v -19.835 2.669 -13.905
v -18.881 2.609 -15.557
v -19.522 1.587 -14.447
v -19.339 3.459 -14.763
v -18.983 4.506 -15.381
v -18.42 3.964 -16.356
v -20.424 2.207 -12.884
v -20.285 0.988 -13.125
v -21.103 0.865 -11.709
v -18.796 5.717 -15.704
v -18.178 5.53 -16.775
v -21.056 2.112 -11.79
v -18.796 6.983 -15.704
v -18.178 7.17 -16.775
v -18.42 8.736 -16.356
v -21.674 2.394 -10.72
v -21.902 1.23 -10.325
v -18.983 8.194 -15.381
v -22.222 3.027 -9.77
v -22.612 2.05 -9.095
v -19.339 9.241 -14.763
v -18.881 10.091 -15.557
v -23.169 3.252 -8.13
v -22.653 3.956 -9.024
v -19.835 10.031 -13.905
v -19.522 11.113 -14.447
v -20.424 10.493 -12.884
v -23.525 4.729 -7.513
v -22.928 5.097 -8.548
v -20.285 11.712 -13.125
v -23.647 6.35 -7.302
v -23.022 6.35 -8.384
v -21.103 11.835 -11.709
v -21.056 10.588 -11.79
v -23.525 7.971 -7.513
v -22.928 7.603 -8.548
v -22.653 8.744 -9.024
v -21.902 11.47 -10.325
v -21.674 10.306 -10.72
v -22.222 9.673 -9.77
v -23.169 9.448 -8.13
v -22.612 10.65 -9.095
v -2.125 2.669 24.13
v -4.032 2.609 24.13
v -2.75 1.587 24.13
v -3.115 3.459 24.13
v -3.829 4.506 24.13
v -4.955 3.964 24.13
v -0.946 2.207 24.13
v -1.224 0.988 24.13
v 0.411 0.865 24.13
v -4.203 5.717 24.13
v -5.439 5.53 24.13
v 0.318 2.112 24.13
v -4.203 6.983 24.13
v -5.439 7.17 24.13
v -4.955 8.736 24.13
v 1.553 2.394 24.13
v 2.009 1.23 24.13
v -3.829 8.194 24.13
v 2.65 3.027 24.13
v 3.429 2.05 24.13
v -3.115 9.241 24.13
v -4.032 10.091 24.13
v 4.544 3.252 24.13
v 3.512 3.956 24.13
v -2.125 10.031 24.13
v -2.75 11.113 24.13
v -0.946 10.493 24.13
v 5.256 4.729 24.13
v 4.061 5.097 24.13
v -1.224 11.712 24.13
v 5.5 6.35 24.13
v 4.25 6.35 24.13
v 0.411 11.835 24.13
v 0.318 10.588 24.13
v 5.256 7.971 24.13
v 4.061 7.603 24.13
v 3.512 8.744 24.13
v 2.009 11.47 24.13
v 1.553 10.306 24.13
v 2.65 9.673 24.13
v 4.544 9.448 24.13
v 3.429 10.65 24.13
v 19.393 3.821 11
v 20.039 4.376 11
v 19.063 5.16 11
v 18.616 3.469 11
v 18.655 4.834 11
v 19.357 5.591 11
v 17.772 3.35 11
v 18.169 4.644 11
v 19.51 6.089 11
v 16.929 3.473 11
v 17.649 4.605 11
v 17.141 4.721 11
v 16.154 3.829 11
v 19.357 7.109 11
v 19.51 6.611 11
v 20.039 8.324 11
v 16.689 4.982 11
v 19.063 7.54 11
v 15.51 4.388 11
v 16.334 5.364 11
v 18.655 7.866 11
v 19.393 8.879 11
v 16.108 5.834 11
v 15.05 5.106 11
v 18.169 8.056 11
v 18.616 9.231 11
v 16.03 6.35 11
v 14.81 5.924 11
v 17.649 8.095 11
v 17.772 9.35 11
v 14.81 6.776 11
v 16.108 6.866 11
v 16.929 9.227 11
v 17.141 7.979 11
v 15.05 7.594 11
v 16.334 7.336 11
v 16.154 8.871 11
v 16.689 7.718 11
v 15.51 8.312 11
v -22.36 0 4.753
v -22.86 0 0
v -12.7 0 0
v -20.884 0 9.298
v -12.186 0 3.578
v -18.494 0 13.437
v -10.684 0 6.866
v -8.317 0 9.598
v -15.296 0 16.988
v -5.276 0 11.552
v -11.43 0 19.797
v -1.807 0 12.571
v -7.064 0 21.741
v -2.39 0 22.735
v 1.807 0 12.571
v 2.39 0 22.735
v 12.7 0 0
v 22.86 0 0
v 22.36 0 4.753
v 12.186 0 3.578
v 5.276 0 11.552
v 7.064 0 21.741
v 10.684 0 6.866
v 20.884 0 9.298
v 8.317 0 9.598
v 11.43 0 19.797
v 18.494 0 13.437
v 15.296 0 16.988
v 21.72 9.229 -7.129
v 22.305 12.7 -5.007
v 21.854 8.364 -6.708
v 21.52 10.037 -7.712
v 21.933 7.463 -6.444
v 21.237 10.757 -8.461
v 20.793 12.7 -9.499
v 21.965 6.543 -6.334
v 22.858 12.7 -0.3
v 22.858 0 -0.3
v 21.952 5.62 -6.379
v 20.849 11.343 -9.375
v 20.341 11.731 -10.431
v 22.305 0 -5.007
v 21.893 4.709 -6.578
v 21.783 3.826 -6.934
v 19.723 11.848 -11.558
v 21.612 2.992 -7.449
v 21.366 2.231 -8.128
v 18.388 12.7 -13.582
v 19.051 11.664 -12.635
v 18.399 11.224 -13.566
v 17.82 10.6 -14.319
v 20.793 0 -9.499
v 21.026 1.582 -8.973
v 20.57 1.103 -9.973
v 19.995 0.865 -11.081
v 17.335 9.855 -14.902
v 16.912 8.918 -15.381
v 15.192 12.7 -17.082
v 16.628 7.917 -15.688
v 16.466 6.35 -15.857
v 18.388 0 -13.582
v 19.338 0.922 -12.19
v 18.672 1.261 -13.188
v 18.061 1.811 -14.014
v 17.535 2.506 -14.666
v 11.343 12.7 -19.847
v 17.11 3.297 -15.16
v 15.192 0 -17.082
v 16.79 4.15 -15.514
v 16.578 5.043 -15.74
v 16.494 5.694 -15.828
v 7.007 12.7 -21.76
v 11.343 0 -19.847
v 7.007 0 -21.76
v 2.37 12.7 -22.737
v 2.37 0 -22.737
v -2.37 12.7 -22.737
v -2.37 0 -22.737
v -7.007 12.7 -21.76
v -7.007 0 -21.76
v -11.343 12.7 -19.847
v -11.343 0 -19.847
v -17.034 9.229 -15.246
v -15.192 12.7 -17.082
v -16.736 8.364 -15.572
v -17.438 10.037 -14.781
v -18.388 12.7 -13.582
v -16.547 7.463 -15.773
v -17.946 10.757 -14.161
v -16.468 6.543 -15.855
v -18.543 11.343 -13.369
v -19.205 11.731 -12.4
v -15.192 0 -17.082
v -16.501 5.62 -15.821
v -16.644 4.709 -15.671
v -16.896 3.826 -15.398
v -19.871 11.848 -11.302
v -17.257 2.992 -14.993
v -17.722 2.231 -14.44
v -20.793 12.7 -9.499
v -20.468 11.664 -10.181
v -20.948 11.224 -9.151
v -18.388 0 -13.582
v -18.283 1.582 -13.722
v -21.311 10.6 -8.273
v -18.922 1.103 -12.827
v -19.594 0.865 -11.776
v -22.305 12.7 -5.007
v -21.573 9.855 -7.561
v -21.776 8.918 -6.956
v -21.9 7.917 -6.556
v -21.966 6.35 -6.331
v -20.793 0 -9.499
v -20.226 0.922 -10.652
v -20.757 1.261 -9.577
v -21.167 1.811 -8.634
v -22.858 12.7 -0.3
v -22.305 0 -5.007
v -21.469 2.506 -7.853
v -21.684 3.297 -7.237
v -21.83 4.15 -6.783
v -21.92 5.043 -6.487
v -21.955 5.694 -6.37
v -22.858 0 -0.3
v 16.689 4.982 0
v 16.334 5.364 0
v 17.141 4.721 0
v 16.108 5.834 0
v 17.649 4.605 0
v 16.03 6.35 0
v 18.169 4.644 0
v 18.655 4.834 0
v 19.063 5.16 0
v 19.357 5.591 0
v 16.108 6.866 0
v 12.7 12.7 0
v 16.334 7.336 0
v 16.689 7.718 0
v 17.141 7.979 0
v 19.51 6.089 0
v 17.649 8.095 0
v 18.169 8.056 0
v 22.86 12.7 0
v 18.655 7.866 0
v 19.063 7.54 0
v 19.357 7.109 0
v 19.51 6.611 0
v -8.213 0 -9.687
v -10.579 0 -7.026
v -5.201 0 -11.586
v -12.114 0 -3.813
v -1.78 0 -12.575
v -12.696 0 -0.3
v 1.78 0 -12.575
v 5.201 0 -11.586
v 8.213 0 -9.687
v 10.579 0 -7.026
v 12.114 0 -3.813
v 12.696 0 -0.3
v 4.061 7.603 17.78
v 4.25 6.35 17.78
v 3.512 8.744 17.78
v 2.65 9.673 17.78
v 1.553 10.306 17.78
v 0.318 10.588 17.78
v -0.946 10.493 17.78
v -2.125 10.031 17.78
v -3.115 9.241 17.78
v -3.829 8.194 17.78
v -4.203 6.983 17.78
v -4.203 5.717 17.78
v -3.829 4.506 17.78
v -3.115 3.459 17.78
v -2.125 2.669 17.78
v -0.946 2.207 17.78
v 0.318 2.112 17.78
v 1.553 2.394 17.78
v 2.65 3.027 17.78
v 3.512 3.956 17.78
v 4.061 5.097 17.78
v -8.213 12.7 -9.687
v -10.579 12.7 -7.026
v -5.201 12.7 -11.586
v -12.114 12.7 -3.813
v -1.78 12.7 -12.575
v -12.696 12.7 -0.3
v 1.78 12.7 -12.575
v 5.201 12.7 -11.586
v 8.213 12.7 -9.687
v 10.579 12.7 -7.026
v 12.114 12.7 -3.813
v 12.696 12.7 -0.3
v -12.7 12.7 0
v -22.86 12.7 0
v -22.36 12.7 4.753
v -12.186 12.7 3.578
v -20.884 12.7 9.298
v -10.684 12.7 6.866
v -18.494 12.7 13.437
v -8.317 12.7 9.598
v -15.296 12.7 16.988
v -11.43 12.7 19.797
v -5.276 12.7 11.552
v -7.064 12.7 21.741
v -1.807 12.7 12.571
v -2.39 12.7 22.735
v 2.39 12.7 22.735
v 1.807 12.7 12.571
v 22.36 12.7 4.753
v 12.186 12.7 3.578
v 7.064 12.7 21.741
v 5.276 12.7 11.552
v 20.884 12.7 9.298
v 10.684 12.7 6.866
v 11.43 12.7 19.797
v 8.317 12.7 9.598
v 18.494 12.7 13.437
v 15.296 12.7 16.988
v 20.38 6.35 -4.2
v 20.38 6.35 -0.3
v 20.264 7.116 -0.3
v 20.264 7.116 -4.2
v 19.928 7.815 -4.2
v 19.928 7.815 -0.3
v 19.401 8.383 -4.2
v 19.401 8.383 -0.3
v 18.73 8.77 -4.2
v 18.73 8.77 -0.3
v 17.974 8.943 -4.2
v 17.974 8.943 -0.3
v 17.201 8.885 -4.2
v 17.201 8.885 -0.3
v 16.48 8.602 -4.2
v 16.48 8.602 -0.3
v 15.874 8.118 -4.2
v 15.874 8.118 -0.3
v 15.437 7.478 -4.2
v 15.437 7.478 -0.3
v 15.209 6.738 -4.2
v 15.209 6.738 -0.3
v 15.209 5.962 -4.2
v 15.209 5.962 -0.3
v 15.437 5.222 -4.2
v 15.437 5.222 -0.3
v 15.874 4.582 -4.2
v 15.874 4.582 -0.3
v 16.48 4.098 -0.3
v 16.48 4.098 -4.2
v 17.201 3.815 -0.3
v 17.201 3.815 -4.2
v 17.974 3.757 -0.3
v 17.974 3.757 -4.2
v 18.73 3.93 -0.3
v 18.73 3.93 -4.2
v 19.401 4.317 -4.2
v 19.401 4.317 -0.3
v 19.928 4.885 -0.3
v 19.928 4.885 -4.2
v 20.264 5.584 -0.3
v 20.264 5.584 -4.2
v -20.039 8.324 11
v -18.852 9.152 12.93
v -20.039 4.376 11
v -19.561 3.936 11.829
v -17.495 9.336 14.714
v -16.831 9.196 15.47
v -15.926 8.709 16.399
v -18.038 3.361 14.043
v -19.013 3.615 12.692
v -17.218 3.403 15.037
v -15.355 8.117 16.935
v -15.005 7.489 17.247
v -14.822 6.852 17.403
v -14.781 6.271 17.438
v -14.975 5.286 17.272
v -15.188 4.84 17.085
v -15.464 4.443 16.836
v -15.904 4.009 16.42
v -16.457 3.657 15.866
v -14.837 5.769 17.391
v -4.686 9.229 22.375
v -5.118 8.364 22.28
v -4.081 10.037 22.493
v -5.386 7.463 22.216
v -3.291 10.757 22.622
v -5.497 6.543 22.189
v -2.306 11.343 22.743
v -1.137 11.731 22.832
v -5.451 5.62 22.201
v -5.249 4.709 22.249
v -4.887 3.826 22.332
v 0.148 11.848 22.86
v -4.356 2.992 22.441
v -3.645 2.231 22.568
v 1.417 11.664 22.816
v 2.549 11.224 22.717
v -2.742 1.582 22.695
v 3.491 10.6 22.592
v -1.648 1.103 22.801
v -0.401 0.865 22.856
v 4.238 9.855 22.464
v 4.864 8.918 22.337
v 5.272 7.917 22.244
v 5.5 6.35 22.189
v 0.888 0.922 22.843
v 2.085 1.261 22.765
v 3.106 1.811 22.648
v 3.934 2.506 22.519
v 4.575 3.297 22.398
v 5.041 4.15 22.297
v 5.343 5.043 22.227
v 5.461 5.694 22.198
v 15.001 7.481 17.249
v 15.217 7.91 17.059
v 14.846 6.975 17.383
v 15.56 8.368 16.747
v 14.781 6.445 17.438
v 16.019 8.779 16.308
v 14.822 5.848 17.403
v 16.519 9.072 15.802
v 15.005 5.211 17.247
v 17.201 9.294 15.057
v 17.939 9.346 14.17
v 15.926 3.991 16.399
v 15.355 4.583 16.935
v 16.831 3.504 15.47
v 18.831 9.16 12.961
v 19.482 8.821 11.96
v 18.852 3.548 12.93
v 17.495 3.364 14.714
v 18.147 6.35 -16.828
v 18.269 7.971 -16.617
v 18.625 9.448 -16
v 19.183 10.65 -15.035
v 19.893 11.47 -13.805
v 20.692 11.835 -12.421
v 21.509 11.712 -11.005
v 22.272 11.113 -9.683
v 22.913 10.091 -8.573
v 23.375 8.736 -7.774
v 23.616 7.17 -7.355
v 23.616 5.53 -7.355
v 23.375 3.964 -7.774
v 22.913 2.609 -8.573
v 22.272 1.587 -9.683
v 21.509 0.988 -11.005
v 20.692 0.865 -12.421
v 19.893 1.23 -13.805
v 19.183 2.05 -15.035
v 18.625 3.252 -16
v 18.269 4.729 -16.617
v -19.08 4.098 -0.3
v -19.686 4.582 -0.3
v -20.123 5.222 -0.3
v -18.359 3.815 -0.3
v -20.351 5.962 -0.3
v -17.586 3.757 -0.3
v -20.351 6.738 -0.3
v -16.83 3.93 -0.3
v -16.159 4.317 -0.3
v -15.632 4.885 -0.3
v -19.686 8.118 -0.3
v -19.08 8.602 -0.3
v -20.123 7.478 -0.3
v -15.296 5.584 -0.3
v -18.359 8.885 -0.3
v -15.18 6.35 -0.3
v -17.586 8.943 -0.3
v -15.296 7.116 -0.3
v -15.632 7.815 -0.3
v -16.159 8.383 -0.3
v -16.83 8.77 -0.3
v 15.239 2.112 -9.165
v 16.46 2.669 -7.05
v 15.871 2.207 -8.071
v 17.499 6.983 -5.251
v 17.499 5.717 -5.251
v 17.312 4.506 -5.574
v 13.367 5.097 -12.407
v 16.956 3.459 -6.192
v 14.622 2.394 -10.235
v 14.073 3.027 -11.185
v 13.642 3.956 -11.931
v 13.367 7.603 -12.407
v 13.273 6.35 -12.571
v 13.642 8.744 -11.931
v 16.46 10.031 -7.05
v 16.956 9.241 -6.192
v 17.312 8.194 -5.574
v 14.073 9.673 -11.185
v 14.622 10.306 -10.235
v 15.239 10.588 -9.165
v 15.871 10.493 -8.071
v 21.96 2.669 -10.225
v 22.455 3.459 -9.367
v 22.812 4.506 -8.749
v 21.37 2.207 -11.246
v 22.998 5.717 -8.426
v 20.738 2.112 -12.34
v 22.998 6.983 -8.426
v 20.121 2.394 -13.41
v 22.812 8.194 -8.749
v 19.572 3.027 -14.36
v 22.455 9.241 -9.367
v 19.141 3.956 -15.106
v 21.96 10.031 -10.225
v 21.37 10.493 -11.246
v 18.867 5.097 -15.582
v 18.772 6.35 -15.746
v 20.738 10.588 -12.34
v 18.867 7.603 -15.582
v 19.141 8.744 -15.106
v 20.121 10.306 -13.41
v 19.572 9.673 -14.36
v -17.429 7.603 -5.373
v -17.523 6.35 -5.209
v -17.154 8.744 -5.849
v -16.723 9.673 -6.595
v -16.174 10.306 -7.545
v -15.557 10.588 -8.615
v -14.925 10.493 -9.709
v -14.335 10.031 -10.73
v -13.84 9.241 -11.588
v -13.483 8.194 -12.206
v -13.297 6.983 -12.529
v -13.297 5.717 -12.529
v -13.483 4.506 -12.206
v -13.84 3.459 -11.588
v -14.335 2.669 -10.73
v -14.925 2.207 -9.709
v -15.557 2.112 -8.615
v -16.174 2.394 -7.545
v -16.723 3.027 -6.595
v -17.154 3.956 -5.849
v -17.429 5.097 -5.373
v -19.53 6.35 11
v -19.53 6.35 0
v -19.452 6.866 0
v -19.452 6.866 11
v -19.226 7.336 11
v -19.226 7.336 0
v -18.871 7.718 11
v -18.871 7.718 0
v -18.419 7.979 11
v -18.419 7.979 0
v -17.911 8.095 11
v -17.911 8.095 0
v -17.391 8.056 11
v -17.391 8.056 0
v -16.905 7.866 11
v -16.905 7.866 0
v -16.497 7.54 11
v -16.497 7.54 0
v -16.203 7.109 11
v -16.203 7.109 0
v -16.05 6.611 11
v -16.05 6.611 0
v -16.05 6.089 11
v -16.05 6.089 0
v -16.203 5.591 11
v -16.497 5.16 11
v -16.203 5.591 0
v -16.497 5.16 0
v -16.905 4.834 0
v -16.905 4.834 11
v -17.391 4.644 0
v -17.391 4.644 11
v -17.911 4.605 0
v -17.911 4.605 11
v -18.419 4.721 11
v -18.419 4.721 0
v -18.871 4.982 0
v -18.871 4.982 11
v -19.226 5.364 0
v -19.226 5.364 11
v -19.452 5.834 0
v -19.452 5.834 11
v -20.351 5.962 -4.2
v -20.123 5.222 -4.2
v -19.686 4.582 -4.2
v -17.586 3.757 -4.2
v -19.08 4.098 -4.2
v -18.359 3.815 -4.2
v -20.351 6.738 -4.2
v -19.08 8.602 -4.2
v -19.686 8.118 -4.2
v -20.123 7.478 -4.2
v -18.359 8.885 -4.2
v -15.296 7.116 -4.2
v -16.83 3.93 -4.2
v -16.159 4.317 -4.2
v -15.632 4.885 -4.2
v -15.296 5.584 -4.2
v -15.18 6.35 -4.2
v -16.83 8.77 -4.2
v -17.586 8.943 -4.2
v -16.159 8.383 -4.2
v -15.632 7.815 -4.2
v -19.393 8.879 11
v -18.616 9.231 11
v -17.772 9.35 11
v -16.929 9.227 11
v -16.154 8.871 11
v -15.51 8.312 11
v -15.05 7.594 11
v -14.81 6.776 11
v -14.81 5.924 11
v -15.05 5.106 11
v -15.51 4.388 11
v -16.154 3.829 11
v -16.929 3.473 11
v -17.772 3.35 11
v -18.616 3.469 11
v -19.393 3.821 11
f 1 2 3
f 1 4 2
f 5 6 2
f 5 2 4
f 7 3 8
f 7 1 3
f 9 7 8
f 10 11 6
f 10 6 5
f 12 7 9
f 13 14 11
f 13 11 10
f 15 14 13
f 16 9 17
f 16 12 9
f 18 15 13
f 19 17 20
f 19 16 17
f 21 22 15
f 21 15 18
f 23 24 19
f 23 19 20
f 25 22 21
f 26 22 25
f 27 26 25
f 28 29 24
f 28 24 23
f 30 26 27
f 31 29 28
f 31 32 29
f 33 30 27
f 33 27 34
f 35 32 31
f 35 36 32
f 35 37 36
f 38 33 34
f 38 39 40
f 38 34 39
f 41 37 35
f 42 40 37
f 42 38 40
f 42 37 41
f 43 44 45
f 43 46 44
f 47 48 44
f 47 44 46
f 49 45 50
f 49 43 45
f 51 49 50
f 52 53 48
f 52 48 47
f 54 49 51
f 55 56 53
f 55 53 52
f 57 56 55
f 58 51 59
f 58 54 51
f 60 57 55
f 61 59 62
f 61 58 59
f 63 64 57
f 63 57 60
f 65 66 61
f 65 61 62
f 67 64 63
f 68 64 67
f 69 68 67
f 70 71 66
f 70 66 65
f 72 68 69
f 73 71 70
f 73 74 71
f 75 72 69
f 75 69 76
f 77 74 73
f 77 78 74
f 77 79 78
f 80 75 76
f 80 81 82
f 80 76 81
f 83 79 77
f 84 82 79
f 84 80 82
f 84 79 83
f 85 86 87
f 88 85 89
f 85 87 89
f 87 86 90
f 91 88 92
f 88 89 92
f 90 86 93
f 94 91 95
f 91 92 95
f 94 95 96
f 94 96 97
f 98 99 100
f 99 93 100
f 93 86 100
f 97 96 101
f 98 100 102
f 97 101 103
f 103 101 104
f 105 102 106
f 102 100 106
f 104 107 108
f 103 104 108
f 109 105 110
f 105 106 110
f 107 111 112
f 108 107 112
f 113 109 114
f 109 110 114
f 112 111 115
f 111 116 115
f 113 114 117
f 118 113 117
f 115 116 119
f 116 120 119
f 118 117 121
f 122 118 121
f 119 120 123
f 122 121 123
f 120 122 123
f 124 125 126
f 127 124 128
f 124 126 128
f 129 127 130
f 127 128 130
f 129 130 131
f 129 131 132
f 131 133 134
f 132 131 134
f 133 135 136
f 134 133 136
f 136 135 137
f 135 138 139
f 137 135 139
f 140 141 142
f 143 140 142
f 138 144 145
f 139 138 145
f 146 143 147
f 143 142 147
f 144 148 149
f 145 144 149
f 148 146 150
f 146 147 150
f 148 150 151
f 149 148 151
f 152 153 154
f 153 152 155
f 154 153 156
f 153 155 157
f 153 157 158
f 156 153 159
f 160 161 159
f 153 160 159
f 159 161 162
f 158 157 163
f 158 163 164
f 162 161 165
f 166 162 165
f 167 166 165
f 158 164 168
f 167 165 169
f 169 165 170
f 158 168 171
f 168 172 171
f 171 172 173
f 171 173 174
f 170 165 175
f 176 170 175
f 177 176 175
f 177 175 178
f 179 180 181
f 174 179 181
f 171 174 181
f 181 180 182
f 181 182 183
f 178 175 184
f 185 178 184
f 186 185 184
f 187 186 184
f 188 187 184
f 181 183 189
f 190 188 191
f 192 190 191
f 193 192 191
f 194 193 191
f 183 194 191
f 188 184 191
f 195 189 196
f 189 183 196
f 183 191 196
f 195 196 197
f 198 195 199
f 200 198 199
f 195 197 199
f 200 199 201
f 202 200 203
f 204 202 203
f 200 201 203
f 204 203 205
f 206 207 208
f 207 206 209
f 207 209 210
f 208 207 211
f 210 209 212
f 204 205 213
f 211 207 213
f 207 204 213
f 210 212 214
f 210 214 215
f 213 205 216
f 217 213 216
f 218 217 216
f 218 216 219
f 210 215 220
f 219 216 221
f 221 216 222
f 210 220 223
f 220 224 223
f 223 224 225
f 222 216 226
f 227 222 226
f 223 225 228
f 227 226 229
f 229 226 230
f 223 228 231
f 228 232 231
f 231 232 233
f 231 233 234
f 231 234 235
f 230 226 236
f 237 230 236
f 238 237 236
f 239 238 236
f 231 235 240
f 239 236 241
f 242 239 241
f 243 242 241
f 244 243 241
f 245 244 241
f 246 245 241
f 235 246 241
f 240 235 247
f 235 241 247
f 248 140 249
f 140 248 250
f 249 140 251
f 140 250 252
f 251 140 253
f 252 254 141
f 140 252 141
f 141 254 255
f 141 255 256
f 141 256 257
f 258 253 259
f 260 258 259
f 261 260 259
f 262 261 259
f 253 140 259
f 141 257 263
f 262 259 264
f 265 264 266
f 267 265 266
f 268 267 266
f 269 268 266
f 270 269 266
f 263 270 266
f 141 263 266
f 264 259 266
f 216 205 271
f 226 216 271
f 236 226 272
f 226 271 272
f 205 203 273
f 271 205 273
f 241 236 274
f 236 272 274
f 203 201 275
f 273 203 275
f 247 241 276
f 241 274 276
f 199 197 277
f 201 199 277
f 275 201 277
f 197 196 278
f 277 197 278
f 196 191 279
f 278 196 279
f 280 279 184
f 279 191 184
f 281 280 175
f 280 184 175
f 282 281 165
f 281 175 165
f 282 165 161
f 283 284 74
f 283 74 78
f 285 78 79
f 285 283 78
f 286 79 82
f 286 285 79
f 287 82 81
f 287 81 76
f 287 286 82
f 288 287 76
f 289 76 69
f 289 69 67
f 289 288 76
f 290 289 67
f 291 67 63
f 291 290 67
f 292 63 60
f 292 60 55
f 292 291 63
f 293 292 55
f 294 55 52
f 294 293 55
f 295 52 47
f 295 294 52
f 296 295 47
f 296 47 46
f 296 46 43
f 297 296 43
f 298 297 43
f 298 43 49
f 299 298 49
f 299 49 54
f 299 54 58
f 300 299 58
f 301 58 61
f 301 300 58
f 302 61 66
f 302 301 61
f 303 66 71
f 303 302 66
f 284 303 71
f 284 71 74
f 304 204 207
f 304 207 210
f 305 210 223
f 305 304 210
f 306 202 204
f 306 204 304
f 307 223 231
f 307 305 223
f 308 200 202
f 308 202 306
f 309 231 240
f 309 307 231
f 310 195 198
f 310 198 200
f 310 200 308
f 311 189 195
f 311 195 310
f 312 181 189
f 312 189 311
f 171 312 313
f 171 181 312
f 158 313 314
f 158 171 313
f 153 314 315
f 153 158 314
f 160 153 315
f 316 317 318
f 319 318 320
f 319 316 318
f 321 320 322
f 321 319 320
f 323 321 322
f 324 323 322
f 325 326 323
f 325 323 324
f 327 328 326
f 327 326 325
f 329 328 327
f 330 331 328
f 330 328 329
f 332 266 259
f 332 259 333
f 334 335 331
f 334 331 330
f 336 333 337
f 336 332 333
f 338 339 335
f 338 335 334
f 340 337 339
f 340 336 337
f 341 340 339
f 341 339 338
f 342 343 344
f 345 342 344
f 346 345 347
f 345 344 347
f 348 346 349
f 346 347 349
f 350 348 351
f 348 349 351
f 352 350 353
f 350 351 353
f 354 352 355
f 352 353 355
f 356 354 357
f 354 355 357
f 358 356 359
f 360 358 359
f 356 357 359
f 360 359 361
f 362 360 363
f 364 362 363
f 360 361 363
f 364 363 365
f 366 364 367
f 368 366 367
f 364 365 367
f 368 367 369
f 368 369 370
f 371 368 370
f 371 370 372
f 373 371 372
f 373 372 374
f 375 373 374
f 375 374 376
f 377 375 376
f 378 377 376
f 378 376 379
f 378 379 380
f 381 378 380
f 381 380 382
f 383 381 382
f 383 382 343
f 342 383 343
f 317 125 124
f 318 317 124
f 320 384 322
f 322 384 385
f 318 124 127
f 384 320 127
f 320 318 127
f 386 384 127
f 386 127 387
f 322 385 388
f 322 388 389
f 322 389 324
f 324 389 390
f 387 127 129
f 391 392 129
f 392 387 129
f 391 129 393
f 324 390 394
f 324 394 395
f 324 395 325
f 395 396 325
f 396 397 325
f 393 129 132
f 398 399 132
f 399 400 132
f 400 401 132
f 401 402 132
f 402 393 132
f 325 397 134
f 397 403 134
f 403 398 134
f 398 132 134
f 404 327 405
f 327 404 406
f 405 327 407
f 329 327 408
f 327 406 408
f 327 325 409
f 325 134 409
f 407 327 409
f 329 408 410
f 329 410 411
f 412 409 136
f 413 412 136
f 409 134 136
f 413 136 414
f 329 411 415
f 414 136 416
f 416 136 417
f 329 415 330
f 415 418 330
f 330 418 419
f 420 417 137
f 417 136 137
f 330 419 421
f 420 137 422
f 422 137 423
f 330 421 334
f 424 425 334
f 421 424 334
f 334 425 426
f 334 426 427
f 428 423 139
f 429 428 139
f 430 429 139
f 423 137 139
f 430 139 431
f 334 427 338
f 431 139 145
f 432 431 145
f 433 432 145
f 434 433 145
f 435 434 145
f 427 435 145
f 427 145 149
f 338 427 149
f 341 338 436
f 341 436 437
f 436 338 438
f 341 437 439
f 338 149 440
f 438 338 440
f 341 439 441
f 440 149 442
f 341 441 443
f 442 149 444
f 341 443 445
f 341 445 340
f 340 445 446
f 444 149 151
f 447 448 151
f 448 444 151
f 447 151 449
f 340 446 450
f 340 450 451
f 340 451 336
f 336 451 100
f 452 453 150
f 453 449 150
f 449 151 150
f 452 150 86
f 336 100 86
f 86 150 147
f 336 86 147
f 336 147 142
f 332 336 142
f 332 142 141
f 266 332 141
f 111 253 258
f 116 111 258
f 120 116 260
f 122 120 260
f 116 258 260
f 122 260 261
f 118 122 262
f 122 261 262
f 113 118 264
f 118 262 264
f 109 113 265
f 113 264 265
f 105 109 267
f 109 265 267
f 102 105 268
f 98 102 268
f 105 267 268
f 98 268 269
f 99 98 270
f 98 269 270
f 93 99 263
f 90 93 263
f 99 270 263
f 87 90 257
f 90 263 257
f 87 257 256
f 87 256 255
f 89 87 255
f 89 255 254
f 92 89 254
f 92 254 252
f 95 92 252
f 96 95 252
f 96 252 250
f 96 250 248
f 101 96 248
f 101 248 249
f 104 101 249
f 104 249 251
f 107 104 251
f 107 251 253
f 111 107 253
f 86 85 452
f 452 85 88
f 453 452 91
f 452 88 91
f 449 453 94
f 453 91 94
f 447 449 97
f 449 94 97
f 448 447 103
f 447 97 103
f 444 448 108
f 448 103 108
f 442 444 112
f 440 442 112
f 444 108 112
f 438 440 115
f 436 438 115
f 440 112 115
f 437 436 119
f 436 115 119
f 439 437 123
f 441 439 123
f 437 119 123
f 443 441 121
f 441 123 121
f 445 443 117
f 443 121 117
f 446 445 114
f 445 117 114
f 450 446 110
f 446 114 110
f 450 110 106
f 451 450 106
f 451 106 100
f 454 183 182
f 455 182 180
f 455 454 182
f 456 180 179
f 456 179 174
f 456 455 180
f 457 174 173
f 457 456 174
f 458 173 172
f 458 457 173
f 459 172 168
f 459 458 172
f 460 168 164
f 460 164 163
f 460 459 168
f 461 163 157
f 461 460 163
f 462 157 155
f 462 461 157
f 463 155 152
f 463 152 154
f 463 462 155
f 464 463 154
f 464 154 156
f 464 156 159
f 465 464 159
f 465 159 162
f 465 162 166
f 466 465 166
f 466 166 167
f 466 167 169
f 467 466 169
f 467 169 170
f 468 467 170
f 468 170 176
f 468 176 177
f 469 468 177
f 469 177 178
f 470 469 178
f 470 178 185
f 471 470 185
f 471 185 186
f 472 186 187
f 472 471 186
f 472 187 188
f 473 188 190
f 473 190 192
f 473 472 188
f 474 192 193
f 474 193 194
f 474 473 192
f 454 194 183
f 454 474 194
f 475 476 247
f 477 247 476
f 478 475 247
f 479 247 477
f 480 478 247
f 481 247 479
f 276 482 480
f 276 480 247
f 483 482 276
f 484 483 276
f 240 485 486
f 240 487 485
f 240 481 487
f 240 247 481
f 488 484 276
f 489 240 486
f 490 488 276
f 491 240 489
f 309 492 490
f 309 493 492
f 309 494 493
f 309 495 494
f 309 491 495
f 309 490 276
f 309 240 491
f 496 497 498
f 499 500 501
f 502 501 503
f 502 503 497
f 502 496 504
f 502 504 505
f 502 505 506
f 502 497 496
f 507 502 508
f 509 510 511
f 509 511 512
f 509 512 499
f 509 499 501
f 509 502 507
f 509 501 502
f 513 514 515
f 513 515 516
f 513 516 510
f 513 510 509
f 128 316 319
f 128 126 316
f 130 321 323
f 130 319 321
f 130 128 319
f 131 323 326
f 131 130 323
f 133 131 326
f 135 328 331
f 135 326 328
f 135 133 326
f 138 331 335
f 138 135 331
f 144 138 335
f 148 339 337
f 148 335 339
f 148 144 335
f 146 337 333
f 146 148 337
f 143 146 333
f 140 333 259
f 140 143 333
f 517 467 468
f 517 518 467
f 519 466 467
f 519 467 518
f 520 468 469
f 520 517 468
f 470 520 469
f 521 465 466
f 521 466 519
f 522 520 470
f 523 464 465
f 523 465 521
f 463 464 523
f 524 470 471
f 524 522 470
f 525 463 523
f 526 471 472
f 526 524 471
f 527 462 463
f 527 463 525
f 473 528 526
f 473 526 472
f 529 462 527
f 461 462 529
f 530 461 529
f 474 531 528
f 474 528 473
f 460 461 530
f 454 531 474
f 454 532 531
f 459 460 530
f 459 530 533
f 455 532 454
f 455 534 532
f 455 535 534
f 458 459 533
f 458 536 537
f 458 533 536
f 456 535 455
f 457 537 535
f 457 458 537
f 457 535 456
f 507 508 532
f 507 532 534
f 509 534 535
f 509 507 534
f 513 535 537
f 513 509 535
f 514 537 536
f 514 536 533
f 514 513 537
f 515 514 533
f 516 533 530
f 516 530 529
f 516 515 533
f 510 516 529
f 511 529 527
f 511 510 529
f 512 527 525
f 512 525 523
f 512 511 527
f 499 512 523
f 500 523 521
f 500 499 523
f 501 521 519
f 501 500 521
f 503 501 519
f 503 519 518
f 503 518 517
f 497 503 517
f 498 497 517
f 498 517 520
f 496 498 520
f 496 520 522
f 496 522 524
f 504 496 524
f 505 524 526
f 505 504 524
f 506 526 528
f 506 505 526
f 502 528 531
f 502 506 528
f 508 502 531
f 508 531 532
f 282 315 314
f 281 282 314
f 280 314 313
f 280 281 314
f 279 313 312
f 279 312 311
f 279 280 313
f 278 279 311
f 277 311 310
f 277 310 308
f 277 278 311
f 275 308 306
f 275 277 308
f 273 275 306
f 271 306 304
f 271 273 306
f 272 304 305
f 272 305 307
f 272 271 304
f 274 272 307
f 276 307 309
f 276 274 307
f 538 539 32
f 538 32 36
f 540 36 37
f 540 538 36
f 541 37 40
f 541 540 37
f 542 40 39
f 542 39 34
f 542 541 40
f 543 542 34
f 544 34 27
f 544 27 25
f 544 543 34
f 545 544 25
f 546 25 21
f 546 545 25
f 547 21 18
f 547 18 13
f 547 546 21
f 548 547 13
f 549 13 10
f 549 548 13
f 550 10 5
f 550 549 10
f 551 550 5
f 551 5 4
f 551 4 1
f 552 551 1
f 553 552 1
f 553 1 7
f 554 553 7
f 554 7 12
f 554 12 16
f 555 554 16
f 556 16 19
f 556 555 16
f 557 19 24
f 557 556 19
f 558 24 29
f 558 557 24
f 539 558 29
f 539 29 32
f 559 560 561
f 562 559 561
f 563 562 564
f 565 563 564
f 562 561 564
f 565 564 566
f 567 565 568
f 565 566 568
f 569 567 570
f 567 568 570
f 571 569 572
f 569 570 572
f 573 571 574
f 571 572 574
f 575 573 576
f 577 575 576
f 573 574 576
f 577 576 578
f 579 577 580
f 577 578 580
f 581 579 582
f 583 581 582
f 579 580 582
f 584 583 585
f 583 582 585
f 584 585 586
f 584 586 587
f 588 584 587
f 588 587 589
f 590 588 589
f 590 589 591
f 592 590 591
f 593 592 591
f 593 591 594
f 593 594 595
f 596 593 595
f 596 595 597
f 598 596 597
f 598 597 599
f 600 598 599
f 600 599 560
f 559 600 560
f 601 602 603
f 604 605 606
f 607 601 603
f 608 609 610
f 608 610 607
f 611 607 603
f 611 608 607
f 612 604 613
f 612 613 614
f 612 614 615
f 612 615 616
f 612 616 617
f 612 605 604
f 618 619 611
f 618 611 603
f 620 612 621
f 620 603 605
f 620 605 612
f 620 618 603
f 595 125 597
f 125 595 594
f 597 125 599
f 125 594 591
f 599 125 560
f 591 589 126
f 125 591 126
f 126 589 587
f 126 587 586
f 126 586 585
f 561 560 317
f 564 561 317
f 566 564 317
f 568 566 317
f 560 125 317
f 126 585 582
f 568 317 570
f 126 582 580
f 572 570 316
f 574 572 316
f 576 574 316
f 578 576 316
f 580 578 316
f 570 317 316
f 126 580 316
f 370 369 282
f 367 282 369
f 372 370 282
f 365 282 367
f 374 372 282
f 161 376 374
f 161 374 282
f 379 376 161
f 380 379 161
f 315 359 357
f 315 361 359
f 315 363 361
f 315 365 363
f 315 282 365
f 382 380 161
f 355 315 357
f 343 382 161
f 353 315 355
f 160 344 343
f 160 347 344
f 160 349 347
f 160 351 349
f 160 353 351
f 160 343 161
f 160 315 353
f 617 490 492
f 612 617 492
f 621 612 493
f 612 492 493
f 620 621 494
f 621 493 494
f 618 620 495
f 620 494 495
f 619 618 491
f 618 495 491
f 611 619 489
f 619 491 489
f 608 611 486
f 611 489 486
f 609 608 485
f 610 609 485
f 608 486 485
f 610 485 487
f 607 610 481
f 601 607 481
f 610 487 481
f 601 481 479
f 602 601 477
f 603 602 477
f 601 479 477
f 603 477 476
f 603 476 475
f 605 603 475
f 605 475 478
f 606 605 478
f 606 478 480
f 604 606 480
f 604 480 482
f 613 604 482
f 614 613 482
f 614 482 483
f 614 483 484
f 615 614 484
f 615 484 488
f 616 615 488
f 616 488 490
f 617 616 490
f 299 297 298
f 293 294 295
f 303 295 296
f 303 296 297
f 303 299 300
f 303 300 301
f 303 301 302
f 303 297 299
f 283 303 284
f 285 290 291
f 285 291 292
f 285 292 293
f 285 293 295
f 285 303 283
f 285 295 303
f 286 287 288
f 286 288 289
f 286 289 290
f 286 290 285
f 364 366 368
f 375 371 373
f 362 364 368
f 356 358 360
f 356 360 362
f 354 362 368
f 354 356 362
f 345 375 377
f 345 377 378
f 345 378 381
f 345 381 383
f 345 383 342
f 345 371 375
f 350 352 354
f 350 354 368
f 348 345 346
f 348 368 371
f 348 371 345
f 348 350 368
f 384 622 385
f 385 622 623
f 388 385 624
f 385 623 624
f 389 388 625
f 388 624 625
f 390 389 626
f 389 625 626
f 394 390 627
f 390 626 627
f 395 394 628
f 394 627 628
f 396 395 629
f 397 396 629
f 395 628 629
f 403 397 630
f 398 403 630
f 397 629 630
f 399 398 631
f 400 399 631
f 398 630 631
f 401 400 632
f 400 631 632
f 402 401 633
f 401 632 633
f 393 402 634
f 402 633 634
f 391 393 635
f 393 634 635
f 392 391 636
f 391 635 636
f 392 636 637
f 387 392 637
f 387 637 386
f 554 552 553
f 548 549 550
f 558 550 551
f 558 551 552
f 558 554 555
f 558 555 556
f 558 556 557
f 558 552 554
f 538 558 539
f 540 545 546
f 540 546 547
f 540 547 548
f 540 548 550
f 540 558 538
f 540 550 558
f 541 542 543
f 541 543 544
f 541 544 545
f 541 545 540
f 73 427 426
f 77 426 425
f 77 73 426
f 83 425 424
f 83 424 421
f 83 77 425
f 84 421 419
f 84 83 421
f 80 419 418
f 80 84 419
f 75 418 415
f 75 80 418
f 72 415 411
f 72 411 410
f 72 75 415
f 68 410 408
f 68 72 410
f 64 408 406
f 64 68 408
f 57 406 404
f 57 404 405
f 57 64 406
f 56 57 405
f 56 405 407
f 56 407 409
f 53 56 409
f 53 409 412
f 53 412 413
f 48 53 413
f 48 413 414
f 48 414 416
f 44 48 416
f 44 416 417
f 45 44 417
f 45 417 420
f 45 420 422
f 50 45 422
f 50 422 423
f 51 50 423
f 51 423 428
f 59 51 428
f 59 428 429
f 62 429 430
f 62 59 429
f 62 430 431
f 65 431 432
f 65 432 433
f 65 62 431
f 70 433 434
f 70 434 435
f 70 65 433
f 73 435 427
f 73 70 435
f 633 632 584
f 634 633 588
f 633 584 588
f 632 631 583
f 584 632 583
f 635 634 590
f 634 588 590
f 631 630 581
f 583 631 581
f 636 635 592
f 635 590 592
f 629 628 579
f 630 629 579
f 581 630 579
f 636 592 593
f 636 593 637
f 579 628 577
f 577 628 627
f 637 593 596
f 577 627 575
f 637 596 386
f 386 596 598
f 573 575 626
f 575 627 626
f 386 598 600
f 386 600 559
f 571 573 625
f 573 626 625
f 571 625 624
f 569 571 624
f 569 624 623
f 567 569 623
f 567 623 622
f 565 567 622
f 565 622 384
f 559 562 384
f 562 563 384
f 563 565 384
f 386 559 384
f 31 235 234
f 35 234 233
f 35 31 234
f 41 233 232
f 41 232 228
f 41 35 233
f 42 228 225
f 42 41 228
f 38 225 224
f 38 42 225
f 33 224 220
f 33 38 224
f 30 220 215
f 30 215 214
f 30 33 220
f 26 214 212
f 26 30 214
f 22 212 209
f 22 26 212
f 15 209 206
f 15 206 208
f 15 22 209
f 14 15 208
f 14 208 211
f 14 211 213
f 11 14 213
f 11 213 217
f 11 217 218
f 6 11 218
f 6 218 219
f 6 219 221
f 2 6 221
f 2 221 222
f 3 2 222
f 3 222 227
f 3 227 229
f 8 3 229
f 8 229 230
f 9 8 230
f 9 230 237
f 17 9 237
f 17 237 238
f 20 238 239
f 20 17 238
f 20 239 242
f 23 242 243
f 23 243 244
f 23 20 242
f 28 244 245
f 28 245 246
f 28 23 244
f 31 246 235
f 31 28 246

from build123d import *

# Parameters (mm, degrees)
SKETCH1_R                = 22.86
SKETCH1_R_2              = 12.7
BOSS_EXTRUDE1_DEPTH      = 12.7
BOSS_EXTRUDE2_REACH      = 55.777
BOSS_EXTRUDE2_END_RADIUS = 22.86
SKETCH4_R                = 5.5
CUT_EXTRUDE3_START       = 17.78
SKETCH2_R                = 4.25
CUT_EXTRUDE3_DEPTH       = 6.35
CIRPATTERN1_COUNT        = 3
SKETCH5_R                = 2.6
CUT_EXTRUDE4_DEPTH       = 4.2
SKETCH5_3_R              = 2.6
CUT_EXTRUDE5_DEPTH       = 0.3
CUT_EXTRUDE6_REACH       = 38.093
CUT_EXTRUDE6_END_RADIUS  = 22.86
SKETCH6_R                = 1.75
CUT_EXTRUDE7_START       = -11
SKETCH6_3_R              = 3
CUT_EXTRUDE7_DEPTH       = 26.09344329


with BuildPart() as part:
    # Sketch1 → Boss-Extrude1 (new body)
    with BuildSketch(Plane(origin=(0, 0, 0), x_dir=(1, 0, 0), z_dir=(0, 1, 0))):
        with Locations(Location((0, 0, 0), (0, 0, 270))):
            Circle(SKETCH1_R)
        with Locations(Location((0, 0, 0), (0, 0, 270))):
            Circle(SKETCH1_R_2, mode=Mode.SUBTRACT)
    extrude(amount=BOSS_EXTRUDE1_DEPTH)

    # Boss-Extrude2: up to this cylinder (the profile starts outside it)
    boss_extrude2_end = Plane(origin=(0, 6.35, 0), z_dir=(0, -1, 0)) * Cylinder(BOSS_EXTRUDE2_END_RADIUS, 158.274, mode=Mode.PRIVATE)
    # Sketch4 → Boss-Extrude2 (add, up to the surface)
    with BuildSketch(Plane.XY.offset(24.13), mode=Mode.PRIVATE) as boss_extrude2_sk1:
        with Locations((0, 6.35)):
            Circle(SKETCH4_R)
    boss_extrude2_tool1 = extrude(boss_extrude2_sk1.sketch, amount=-BOSS_EXTRUDE2_REACH, mode=Mode.PRIVATE) - boss_extrude2_end
    boss_extrude2 = boss_extrude2_tool1.solids().sort_by_distance((0, 6.35, 24.13))[0]
    add(boss_extrude2)

    # Sketch2 → Cut-Extrude3 (cut)
    with BuildSketch(Plane.XY.offset(CUT_EXTRUDE3_START)):
        with Locations((0, 6.35)):
            Circle(SKETCH2_R)
    cut_extrude3 = extrude(amount=CUT_EXTRUDE3_DEPTH, mode=Mode.SUBTRACT)

    # CirPattern1: Boss-Extrude2, Cut-Extrude3 ×3 about axis
    cirpattern1_axis = Axis((0, 0, 0), (0, 1, 0))
    add([boss_extrude2.rotate(cirpattern1_axis, i * 360 / CIRPATTERN1_COUNT) for i in range(1, CIRPATTERN1_COUNT)])
    add([cut_extrude3.rotate(cirpattern1_axis, i * 360 / CIRPATTERN1_COUNT) for i in range(1, CIRPATTERN1_COUNT)], mode=Mode.SUBTRACT)


with BuildPart() as body_2:
    # Split1: the piece on the far side of the plane
    add(part.part)
    split(bisect_by=Plane.XY, keep=Keep.BOTTOM)

    # Sketch5 → Cut-Extrude4 (cut)
    with BuildSketch(Plane.XY):
        with Locations((17.78, 6.35)):
            Circle(SKETCH5_R)
        with Locations((-17.78, 6.35)):
            Circle(SKETCH5_R)
    extrude(amount=-CUT_EXTRUDE4_DEPTH, mode=Mode.SUBTRACT)

    # Sketch5<3> → Cut-Extrude5 (cut)
    with BuildSketch(Plane.XY):
        Polygon((22.86, 12.7), (12.7, 12.7), (-22.86, 12.7), (-22.86, 0), (12.7, 0), (22.86, 0), align=None)
        with Locations((-17.78, 6.35)):
            Circle(SKETCH5_3_R, mode=Mode.SUBTRACT)
        with Locations((17.78, 6.35)):
            Circle(SKETCH5_3_R, mode=Mode.SUBTRACT)
    extrude(amount=-CUT_EXTRUDE5_DEPTH, mode=Mode.SUBTRACT)


with BuildPart() as part_1:
    add(part.part)

    # Split1
    split(bisect_by=Plane.XY, keep=Keep.TOP)

    # Cut-Extrude6: up to this cylinder (the profile starts inside it)
    cut_extrude6_end = Plane(origin=(0, 6.35, 0), z_dir=(0, -1, 0)) * Cylinder(CUT_EXTRUDE6_END_RADIUS, 122.906, mode=Mode.PRIVATE)
    # Sketch6 → Cut-Extrude6 (cut, up to the surface)
    with BuildSketch(Plane(origin=(0, 0, 0), x_dir=(-1, 0, 0), z_dir=(0, 0, -1)), mode=Mode.PRIVATE) as cut_extrude6_sk1:
        with Locations((-17.78, 6.35)):
            Circle(SKETCH6_R)
    cut_extrude6_tool1 = extrude(cut_extrude6_sk1.sketch, amount=-CUT_EXTRUDE6_REACH, mode=Mode.PRIVATE) & cut_extrude6_end
    add(cut_extrude6_tool1.solids().sort_by_distance((17.78, 6.35, 0))[0], mode=Mode.SUBTRACT)
    # Sketch6 → Cut-Extrude6 (cut, up to the surface)
    with BuildSketch(Plane(origin=(0, 0, 0), x_dir=(-1, 0, 0), z_dir=(0, 0, -1)), mode=Mode.PRIVATE) as cut_extrude6_sk2:
        with Locations((17.78, 6.35)):
            Circle(SKETCH6_R)
    cut_extrude6_tool2 = extrude(cut_extrude6_sk2.sketch, amount=-CUT_EXTRUDE6_REACH, mode=Mode.PRIVATE) & cut_extrude6_end
    add(cut_extrude6_tool2.solids().sort_by_distance((-17.78, 6.35, 0))[0], mode=Mode.SUBTRACT)

    # Sketch6<3> → Cut-Extrude7 (cut, through all)
    with BuildSketch(Plane(origin=(0, 0, 0), x_dir=(-1, 0, 0), z_dir=(0, 0, -1)).offset(CUT_EXTRUDE7_START)):
        with Locations((-17.78, 6.35)):
            Circle(SKETCH6_3_R)
        with Locations((17.78, 6.35)):
            Circle(SKETCH6_3_R)
    extrude(amount=-CUT_EXTRUDE7_DEPTH, mode=Mode.SUBTRACT)


solid = Compound([body_2.part, part_1.part])
